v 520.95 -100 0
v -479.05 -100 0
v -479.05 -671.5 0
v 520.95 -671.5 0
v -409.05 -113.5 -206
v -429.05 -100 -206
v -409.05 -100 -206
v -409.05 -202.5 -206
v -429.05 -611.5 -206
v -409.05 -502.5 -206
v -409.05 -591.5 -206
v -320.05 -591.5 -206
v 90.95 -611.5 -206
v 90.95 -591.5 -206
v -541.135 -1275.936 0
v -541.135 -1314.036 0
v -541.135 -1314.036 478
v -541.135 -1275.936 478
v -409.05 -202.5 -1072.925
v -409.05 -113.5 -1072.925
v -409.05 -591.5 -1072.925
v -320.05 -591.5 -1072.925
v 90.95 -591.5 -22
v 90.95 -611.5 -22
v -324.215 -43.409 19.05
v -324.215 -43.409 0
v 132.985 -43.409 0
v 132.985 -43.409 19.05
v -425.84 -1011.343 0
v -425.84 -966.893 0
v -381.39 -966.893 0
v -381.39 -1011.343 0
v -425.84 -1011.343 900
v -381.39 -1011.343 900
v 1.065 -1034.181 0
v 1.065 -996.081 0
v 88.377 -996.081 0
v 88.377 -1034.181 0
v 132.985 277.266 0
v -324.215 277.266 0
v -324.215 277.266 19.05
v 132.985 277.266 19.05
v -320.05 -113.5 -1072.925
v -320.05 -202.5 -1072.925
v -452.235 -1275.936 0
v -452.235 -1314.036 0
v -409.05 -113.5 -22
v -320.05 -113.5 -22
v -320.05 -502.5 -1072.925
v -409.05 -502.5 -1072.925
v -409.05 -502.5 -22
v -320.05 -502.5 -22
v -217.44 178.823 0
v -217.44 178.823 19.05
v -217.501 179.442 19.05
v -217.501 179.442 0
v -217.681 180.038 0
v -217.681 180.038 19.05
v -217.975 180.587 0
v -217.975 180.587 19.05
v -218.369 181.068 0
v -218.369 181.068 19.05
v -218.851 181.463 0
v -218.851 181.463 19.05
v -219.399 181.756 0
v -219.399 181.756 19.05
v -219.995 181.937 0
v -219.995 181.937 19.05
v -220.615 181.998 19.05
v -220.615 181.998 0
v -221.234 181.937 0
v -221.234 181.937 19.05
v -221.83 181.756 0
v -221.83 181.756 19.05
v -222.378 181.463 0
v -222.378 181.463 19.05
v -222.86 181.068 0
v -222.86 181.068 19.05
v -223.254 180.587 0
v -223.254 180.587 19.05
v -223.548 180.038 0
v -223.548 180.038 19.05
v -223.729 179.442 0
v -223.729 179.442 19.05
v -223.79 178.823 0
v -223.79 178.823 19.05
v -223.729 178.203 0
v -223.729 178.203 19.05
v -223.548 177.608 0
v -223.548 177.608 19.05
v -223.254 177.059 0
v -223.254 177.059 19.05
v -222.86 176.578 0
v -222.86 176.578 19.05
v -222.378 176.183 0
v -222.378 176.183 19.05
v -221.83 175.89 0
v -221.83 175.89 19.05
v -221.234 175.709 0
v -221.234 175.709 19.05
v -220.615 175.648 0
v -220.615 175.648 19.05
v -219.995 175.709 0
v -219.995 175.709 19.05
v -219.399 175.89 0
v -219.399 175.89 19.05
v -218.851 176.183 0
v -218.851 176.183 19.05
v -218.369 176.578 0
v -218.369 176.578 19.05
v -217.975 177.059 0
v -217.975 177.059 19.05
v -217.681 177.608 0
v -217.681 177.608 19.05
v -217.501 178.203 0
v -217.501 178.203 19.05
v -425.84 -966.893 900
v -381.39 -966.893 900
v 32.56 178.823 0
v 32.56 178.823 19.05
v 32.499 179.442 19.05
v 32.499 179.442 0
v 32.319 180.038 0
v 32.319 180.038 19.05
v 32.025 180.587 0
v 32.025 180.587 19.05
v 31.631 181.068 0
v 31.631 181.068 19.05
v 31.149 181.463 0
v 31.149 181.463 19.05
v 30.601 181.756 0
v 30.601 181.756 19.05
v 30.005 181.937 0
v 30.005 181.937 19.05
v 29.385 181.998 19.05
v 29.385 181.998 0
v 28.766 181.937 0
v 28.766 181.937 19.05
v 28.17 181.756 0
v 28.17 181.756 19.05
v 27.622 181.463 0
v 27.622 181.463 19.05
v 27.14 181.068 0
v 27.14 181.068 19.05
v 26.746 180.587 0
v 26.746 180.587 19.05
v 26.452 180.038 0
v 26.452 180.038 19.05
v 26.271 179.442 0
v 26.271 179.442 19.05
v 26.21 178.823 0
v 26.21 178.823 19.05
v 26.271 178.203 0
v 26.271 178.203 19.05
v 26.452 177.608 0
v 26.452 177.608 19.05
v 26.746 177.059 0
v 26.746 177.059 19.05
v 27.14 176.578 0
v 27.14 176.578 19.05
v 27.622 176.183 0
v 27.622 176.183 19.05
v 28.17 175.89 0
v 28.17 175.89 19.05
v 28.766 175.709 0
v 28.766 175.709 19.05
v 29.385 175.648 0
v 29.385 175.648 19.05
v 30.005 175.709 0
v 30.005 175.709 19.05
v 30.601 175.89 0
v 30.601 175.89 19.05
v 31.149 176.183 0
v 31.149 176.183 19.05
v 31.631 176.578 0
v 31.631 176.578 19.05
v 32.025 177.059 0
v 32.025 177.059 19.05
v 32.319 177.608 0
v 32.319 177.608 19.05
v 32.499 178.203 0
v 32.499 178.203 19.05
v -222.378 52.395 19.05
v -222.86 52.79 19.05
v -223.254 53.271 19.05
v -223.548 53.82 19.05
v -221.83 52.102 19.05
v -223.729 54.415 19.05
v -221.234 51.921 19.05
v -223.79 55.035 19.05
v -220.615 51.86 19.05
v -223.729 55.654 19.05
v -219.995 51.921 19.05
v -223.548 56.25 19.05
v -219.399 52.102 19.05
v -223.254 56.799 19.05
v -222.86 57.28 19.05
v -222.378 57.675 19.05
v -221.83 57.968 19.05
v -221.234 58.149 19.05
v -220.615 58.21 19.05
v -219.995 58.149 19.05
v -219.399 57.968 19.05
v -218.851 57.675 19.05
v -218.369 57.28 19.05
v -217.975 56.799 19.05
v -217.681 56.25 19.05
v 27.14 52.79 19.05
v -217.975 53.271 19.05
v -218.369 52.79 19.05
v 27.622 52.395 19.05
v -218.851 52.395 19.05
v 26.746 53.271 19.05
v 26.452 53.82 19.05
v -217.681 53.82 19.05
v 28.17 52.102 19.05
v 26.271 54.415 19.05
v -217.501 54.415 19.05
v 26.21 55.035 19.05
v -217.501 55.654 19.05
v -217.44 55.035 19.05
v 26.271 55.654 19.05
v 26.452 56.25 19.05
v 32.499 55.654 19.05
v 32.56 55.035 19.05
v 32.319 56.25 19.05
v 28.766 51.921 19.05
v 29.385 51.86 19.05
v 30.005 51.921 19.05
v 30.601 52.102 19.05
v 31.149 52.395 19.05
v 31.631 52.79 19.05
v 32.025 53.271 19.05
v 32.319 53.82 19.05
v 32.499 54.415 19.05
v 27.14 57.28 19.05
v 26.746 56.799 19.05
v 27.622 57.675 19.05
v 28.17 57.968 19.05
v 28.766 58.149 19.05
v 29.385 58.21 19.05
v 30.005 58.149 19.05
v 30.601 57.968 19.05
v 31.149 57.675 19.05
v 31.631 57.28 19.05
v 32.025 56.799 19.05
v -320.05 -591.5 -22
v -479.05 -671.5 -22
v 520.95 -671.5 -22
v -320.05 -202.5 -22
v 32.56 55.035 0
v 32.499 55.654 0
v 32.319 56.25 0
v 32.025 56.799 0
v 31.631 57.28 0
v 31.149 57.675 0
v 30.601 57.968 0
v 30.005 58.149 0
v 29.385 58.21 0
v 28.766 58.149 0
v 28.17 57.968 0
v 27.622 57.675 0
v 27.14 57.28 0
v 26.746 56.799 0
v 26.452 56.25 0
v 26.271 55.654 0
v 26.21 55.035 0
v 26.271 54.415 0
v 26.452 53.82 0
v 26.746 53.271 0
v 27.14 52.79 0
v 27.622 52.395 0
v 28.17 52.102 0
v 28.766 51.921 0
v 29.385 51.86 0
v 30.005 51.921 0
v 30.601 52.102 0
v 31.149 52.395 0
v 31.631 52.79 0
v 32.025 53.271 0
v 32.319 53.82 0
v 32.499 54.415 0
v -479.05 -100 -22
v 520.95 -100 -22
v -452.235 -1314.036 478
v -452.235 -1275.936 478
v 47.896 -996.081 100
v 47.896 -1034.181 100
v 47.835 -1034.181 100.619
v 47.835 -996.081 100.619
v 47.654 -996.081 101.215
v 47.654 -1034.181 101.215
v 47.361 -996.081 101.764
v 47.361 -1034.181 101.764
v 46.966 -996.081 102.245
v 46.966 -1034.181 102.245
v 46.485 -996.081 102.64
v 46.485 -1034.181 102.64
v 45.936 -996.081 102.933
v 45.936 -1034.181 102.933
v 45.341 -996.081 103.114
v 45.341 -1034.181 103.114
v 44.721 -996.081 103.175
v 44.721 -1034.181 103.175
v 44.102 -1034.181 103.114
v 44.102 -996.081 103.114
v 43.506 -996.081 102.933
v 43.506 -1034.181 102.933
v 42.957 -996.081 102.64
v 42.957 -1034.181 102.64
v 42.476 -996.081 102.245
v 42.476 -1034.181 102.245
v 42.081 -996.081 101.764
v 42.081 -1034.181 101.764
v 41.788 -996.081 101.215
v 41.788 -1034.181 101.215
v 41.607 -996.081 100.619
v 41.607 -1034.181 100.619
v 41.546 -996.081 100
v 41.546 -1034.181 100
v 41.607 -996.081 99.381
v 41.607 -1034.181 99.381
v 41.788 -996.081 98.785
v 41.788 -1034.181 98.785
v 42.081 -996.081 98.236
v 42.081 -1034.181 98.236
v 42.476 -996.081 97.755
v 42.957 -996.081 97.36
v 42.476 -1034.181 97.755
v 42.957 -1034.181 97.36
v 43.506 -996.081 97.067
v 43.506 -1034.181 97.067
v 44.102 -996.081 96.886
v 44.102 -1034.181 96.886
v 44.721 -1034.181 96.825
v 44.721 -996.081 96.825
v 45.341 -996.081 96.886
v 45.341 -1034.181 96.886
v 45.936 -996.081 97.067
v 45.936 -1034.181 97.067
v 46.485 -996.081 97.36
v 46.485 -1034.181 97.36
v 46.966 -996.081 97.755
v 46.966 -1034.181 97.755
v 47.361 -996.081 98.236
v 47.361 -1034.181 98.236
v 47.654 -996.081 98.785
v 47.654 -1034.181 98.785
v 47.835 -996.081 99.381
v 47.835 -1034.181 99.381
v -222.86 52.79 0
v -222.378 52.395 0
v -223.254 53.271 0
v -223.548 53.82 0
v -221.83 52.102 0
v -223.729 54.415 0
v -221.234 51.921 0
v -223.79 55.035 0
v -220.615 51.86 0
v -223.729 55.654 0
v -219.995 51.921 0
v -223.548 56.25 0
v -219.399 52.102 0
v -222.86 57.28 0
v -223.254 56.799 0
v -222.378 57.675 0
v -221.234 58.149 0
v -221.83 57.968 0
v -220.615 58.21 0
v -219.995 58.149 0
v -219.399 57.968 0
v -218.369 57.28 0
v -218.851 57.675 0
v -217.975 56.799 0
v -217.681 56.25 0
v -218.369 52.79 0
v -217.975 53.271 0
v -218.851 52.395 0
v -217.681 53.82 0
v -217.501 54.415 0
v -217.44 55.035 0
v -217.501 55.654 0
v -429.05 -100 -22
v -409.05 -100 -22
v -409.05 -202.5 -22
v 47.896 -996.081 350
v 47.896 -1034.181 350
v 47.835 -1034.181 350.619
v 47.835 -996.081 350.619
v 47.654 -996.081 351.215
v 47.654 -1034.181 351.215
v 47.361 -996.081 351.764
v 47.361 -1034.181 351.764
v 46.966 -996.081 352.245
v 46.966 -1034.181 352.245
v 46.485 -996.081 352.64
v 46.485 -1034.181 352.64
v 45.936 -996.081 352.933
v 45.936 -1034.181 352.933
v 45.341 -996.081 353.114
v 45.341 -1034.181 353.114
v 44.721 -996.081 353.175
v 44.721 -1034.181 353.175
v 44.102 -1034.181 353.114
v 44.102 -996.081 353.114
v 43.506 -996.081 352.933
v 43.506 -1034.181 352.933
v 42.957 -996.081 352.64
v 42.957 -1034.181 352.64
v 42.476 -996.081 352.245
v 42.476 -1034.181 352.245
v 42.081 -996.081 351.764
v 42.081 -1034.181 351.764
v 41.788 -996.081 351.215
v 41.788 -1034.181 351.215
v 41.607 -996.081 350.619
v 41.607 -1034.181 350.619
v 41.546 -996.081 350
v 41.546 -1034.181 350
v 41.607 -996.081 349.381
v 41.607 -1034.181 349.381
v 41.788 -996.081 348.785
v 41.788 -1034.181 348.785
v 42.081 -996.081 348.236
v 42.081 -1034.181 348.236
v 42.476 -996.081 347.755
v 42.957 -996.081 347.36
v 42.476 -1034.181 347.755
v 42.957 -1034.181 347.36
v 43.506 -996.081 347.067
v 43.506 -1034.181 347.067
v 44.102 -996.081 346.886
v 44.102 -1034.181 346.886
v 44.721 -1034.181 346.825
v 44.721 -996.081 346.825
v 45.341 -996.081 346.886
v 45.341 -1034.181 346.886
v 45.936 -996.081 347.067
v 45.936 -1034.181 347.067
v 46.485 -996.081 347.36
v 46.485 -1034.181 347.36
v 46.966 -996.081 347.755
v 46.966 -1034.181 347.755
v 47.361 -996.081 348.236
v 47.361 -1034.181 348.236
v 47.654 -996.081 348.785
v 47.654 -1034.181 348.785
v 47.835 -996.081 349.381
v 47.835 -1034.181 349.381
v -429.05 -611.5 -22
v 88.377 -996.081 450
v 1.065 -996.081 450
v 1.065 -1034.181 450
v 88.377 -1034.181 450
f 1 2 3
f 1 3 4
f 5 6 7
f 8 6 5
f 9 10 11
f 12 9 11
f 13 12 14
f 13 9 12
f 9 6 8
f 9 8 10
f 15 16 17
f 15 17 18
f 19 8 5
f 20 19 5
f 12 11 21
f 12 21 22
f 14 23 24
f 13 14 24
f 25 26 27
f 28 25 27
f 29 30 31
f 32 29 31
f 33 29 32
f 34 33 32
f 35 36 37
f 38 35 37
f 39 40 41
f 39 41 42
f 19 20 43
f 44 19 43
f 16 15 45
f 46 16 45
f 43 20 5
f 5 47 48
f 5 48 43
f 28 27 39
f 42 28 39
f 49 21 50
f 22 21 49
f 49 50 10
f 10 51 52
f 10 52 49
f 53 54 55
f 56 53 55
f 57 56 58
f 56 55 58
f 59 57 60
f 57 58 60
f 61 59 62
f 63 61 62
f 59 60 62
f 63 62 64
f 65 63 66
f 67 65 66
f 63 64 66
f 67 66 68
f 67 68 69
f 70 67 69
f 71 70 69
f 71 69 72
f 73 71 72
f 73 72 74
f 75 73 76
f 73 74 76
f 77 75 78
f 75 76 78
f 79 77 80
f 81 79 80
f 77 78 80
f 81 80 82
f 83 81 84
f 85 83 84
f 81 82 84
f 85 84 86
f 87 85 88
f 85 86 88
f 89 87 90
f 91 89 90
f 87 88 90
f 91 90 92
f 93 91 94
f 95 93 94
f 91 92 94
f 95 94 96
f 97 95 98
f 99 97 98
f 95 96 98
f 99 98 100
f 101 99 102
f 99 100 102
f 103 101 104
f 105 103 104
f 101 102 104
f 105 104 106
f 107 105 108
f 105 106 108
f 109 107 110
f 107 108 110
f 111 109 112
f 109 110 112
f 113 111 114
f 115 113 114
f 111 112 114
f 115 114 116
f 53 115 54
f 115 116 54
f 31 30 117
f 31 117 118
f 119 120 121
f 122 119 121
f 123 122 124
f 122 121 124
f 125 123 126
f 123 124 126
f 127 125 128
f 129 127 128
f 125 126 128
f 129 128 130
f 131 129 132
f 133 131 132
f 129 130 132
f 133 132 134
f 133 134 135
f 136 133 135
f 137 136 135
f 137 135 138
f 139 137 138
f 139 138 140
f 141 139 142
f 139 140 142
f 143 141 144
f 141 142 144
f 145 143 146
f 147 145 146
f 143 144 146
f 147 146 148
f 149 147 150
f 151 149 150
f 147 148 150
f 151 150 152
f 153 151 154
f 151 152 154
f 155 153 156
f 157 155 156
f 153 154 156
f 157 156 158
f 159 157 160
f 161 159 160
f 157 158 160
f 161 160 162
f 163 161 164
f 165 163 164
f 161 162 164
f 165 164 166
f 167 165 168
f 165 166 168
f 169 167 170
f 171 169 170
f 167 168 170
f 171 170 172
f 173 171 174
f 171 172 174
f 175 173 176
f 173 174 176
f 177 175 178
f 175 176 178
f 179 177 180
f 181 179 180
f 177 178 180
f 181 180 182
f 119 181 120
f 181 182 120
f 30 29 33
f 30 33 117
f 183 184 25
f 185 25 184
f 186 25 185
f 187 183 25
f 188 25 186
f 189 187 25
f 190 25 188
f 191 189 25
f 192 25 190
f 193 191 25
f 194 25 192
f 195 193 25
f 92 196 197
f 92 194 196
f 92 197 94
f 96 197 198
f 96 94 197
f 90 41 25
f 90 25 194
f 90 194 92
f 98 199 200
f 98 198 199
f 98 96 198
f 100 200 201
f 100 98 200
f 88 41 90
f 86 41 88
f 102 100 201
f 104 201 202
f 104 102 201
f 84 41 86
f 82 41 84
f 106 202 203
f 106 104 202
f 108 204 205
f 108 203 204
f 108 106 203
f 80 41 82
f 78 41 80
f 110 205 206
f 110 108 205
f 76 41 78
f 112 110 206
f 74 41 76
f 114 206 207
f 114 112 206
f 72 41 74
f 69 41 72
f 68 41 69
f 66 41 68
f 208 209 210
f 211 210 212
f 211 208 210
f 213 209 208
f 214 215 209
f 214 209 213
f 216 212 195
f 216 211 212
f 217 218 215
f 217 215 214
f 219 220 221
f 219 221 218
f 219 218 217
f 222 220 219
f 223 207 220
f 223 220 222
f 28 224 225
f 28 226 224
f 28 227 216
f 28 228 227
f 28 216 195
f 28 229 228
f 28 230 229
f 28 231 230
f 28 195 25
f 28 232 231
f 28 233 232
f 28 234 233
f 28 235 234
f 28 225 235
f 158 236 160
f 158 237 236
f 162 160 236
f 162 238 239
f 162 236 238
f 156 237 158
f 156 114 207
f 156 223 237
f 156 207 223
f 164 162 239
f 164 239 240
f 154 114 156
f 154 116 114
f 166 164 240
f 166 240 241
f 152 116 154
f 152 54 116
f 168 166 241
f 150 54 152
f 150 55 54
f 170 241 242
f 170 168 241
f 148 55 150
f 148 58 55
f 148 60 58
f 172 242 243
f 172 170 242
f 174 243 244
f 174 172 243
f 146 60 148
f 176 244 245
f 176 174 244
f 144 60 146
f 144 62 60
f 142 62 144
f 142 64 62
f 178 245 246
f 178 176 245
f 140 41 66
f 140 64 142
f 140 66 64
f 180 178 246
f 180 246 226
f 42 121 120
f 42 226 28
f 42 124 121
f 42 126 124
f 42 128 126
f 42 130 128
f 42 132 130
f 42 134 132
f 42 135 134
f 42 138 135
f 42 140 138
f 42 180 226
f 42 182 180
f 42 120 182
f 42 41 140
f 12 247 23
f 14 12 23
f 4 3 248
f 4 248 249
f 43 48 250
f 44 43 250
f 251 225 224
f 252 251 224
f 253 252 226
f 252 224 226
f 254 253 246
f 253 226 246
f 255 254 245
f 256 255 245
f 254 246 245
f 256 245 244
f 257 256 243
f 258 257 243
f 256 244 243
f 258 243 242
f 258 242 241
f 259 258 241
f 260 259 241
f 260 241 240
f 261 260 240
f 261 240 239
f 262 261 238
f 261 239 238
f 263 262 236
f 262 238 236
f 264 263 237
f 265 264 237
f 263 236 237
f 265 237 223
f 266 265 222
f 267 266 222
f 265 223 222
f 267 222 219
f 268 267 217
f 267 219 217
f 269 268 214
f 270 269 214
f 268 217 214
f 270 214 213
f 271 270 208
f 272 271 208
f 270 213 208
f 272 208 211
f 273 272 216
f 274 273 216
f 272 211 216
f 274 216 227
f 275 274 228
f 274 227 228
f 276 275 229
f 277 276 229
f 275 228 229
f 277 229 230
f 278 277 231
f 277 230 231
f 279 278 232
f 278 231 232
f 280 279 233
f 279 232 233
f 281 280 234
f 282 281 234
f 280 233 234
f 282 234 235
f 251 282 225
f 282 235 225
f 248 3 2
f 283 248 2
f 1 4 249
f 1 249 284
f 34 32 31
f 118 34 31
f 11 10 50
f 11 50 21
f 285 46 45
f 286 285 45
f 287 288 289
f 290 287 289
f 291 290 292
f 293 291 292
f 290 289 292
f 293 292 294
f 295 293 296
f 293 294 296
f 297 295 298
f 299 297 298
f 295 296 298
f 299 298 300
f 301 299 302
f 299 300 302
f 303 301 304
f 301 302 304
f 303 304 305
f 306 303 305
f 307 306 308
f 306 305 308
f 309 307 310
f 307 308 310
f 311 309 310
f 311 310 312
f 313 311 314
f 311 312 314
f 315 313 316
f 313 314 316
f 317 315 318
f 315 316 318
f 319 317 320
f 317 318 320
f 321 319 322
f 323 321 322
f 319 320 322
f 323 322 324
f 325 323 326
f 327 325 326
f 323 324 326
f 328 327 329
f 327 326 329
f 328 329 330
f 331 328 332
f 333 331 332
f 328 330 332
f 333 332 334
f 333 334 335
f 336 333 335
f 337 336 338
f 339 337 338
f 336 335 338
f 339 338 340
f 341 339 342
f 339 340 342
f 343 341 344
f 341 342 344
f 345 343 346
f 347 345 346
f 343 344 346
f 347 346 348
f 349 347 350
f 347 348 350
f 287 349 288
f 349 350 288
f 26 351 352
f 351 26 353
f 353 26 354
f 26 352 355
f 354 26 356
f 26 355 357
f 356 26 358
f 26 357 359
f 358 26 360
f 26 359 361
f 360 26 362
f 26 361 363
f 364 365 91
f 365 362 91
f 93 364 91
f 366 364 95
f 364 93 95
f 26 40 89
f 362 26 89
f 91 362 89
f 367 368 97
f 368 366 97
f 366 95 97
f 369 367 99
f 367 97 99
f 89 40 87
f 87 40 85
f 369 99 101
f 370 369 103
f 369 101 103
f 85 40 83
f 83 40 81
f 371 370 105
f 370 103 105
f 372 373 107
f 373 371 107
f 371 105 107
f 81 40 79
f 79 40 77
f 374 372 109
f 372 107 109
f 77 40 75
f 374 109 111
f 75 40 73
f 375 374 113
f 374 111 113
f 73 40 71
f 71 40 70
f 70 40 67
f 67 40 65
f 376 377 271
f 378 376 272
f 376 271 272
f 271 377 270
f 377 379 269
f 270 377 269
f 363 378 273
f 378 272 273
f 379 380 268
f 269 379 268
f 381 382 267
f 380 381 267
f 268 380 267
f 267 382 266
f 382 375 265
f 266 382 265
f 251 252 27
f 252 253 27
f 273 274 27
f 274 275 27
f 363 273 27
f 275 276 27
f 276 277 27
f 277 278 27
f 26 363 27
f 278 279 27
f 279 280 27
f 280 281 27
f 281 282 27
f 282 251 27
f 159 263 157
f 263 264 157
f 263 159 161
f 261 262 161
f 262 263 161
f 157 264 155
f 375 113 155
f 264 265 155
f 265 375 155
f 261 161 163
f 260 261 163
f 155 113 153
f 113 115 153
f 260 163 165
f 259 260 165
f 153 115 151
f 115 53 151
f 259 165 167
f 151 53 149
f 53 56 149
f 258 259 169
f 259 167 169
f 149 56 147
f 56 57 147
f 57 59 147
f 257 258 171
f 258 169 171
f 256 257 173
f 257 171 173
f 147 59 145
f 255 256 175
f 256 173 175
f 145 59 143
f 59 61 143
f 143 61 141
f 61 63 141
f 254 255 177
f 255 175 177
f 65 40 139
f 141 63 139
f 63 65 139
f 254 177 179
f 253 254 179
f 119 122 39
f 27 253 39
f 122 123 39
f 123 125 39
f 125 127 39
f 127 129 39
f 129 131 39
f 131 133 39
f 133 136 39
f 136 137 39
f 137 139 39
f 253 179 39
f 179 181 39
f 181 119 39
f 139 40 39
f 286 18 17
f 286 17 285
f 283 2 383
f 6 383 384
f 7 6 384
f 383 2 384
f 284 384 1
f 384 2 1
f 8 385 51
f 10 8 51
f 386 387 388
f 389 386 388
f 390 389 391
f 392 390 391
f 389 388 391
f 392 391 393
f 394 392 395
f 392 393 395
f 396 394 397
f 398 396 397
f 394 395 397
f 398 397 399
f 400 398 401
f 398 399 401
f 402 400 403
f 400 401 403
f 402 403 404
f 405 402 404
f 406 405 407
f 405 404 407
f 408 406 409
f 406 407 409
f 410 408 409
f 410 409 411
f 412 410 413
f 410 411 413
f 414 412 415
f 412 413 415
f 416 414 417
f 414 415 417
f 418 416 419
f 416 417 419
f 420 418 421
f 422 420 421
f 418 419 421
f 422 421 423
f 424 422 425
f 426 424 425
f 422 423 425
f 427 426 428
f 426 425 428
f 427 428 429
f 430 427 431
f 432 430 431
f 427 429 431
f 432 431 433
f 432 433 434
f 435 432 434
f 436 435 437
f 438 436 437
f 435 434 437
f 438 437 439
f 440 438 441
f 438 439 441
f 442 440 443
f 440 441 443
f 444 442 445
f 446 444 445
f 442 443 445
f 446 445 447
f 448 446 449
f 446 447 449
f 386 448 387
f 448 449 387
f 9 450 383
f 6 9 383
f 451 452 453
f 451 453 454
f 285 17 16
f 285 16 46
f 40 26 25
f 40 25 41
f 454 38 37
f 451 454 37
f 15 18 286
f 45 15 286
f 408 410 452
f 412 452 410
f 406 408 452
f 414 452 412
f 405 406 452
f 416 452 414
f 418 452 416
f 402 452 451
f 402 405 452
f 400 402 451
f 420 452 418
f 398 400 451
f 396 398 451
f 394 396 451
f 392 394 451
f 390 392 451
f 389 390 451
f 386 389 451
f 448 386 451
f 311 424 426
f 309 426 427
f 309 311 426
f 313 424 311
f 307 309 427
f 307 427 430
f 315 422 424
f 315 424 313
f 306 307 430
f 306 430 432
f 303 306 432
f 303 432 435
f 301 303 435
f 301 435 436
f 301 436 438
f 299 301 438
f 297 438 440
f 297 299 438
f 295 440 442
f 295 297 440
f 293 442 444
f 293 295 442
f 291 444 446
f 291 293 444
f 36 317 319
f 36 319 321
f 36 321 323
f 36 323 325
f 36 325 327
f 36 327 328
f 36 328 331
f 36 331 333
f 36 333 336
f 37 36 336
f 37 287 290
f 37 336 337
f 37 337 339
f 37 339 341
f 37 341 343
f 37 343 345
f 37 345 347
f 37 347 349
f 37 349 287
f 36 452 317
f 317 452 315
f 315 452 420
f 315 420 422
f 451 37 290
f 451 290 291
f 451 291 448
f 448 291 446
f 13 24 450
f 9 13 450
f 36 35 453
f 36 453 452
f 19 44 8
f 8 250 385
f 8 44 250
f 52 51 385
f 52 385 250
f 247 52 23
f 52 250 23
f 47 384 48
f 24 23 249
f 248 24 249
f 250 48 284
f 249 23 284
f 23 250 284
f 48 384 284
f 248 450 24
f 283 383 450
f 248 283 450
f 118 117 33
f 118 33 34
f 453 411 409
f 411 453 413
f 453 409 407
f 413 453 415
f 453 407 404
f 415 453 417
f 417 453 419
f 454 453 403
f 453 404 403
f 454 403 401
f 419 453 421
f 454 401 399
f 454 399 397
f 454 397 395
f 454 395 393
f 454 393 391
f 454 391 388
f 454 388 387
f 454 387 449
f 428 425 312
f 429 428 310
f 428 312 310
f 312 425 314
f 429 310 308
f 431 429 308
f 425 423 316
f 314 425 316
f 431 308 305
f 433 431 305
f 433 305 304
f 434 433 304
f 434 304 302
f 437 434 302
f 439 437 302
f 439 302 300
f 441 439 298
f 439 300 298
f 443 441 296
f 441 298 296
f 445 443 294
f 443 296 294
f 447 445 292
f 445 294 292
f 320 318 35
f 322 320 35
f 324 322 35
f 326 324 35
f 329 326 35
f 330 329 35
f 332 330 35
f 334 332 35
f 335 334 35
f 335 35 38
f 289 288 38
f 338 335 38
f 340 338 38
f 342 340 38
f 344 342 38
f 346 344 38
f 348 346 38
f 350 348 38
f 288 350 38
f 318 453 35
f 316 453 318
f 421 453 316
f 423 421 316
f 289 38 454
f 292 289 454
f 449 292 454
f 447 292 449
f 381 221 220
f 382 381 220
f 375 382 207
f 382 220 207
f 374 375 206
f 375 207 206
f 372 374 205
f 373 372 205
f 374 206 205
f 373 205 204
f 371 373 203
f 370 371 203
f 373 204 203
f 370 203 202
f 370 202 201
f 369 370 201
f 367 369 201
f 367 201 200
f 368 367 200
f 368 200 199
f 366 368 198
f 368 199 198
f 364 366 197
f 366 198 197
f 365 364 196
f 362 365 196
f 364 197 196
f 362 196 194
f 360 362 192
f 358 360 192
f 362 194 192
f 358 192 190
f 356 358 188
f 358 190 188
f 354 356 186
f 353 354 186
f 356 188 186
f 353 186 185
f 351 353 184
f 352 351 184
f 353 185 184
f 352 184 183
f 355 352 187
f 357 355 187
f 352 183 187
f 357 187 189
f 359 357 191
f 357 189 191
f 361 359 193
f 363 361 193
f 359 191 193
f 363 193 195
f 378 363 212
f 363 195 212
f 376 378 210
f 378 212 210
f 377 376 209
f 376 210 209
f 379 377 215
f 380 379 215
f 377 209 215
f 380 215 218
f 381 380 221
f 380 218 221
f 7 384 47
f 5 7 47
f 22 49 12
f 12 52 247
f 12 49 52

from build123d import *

# Parameters (mm, degrees)
F0_W      = 457.2
F0_H      = 320.675
F1_DEPTH  = 19.05
F2_W      = 1000
F2_H      = 571.5
F3_DEPTH  = 22
F5_DEPTH  = 184
F4_W      = 89
F4_H      = 89
F6_DEPTH  = 1050.925
F7_W      = 44.45
F7_H      = 44.45
F8_DEPTH  = 900
F9_W      = 87.3125
F9_H      = 38.1
F10_DEPTH = 450
F11_R     = 3.175
F12_DEPTH = 19.05
F13_R     = 3.175
F14_DEPTH = 38.1
F15_W     = 88.9
F15_H     = 38.1
F16_DEPTH = 478


# Not quite as in the source:
# - a feature names something its author has since deleted; it is built from what else it names


with BuildPart() as f1:
    # F0 (on Top) → F1 (new body)
    with BuildSketch(Plane.XY):
        with Locations((-95.6145071059, 116.9288526843)):
            Rectangle(F0_W, F0_H)
    extrude(amount=F1_DEPTH)

    # F11 (on face) → F12 (cut, through all)
    with BuildSketch(Plane.XY.offset(19.05)):
        with Locations((29.3854928941, 55.0348526843)):
            Circle(F11_R)
        with Locations((29.3854928941, 178.8228526843)):
            Circle(F11_R)
        with Locations((-220.6145071059, 55.0348526843)):
            Circle(F11_R)
        with Locations((-220.6145071059, 178.8228526843)):
            Circle(F11_R)
    extrude(amount=-F12_DEPTH, mode=Mode.SUBTRACT)


with BuildPart() as f3:
    # F2 (on Top) → F3 (new body)
    with BuildSketch(Plane.XY):
        with Locations((20.9495377159, -385.75)):
            Rectangle(F2_W, F2_H)
    extrude(amount=-F3_DEPTH)

    # F4 (on face) → F5 (join)
    with BuildSketch(Plane(origin=(0, 0, -22), x_dir=(1, 0, 0), z_dir=(0, 0, -1))):
        Polygon((90.9495377159, 611.5), (-409.0504622841, 611.5), (-409.0504622841, 591.5), (-320.0504622841, 591.5), (90.9495377159, 591.5), align=None)
        Polygon((-429.0504622841, 611.5), (-429.0504622841, 100), (-409.0504622841, 100), (-409.0504622841, 113.5), (-409.0504622841, 120), (-409.0504622841, 202.5), (-409.0504622841, 502.5), (-409.0504622841, 591.5), (-409.0504622841, 611.5), align=None)
    extrude(amount=F5_DEPTH)

    # F4 (on face) → F6 (join)
    with BuildSketch(Plane(origin=(0, 0, -22), x_dir=(1, 0, 0), z_dir=(0, 0, -1))):
        with Locations((-364.5504622841, 547)):
            Rectangle(F4_W, F4_H)
        Polygon((-409.0504622841, 120), (-409.0504622841, 113.5), (-320.0504622841, 113.5), (-320.0504622841, 202.5), (-409.0504622841, 202.5), align=None)
    extrude(amount=F6_DEPTH)


with BuildPart() as f8:
    # F7 (on Top) → F8 (new body)
    with BuildSketch(Plane.XY):
        with Locations((-403.6145740495, -989.1184568405)):
            Rectangle(F7_W, F7_H)
    extrude(amount=F8_DEPTH)


with BuildPart() as f10:
    # F9 (on Top) → F10 (new body)
    with BuildSketch(Plane.XY):
        with Locations((44.7211664671, -1015.1306986809)):
            Rectangle(F9_W, F9_H)
    extrude(amount=F10_DEPTH)

    # F13 (on face) → F14 (cut, through all)
    with BuildSketch(Plane.XZ.offset(1034.1806986809)):
        with Locations((44.7211664671, 350)):
            Circle(F13_R)
        with Locations((44.7211664671, 100)):
            Circle(F13_R)
    extrude(amount=-F14_DEPTH, mode=Mode.SUBTRACT)


with BuildPart() as f16:
    # F15 (on Top) → F16 (new body)
    with BuildSketch(Plane.XY):
        with Locations((-496.685385704, -1294.9855373636)):
            Rectangle(F15_W, F15_H)
    extrude(amount=F16_DEPTH)


solid = Compound([f1.part, f3.part, f8.part, f10.part, f16.part])
